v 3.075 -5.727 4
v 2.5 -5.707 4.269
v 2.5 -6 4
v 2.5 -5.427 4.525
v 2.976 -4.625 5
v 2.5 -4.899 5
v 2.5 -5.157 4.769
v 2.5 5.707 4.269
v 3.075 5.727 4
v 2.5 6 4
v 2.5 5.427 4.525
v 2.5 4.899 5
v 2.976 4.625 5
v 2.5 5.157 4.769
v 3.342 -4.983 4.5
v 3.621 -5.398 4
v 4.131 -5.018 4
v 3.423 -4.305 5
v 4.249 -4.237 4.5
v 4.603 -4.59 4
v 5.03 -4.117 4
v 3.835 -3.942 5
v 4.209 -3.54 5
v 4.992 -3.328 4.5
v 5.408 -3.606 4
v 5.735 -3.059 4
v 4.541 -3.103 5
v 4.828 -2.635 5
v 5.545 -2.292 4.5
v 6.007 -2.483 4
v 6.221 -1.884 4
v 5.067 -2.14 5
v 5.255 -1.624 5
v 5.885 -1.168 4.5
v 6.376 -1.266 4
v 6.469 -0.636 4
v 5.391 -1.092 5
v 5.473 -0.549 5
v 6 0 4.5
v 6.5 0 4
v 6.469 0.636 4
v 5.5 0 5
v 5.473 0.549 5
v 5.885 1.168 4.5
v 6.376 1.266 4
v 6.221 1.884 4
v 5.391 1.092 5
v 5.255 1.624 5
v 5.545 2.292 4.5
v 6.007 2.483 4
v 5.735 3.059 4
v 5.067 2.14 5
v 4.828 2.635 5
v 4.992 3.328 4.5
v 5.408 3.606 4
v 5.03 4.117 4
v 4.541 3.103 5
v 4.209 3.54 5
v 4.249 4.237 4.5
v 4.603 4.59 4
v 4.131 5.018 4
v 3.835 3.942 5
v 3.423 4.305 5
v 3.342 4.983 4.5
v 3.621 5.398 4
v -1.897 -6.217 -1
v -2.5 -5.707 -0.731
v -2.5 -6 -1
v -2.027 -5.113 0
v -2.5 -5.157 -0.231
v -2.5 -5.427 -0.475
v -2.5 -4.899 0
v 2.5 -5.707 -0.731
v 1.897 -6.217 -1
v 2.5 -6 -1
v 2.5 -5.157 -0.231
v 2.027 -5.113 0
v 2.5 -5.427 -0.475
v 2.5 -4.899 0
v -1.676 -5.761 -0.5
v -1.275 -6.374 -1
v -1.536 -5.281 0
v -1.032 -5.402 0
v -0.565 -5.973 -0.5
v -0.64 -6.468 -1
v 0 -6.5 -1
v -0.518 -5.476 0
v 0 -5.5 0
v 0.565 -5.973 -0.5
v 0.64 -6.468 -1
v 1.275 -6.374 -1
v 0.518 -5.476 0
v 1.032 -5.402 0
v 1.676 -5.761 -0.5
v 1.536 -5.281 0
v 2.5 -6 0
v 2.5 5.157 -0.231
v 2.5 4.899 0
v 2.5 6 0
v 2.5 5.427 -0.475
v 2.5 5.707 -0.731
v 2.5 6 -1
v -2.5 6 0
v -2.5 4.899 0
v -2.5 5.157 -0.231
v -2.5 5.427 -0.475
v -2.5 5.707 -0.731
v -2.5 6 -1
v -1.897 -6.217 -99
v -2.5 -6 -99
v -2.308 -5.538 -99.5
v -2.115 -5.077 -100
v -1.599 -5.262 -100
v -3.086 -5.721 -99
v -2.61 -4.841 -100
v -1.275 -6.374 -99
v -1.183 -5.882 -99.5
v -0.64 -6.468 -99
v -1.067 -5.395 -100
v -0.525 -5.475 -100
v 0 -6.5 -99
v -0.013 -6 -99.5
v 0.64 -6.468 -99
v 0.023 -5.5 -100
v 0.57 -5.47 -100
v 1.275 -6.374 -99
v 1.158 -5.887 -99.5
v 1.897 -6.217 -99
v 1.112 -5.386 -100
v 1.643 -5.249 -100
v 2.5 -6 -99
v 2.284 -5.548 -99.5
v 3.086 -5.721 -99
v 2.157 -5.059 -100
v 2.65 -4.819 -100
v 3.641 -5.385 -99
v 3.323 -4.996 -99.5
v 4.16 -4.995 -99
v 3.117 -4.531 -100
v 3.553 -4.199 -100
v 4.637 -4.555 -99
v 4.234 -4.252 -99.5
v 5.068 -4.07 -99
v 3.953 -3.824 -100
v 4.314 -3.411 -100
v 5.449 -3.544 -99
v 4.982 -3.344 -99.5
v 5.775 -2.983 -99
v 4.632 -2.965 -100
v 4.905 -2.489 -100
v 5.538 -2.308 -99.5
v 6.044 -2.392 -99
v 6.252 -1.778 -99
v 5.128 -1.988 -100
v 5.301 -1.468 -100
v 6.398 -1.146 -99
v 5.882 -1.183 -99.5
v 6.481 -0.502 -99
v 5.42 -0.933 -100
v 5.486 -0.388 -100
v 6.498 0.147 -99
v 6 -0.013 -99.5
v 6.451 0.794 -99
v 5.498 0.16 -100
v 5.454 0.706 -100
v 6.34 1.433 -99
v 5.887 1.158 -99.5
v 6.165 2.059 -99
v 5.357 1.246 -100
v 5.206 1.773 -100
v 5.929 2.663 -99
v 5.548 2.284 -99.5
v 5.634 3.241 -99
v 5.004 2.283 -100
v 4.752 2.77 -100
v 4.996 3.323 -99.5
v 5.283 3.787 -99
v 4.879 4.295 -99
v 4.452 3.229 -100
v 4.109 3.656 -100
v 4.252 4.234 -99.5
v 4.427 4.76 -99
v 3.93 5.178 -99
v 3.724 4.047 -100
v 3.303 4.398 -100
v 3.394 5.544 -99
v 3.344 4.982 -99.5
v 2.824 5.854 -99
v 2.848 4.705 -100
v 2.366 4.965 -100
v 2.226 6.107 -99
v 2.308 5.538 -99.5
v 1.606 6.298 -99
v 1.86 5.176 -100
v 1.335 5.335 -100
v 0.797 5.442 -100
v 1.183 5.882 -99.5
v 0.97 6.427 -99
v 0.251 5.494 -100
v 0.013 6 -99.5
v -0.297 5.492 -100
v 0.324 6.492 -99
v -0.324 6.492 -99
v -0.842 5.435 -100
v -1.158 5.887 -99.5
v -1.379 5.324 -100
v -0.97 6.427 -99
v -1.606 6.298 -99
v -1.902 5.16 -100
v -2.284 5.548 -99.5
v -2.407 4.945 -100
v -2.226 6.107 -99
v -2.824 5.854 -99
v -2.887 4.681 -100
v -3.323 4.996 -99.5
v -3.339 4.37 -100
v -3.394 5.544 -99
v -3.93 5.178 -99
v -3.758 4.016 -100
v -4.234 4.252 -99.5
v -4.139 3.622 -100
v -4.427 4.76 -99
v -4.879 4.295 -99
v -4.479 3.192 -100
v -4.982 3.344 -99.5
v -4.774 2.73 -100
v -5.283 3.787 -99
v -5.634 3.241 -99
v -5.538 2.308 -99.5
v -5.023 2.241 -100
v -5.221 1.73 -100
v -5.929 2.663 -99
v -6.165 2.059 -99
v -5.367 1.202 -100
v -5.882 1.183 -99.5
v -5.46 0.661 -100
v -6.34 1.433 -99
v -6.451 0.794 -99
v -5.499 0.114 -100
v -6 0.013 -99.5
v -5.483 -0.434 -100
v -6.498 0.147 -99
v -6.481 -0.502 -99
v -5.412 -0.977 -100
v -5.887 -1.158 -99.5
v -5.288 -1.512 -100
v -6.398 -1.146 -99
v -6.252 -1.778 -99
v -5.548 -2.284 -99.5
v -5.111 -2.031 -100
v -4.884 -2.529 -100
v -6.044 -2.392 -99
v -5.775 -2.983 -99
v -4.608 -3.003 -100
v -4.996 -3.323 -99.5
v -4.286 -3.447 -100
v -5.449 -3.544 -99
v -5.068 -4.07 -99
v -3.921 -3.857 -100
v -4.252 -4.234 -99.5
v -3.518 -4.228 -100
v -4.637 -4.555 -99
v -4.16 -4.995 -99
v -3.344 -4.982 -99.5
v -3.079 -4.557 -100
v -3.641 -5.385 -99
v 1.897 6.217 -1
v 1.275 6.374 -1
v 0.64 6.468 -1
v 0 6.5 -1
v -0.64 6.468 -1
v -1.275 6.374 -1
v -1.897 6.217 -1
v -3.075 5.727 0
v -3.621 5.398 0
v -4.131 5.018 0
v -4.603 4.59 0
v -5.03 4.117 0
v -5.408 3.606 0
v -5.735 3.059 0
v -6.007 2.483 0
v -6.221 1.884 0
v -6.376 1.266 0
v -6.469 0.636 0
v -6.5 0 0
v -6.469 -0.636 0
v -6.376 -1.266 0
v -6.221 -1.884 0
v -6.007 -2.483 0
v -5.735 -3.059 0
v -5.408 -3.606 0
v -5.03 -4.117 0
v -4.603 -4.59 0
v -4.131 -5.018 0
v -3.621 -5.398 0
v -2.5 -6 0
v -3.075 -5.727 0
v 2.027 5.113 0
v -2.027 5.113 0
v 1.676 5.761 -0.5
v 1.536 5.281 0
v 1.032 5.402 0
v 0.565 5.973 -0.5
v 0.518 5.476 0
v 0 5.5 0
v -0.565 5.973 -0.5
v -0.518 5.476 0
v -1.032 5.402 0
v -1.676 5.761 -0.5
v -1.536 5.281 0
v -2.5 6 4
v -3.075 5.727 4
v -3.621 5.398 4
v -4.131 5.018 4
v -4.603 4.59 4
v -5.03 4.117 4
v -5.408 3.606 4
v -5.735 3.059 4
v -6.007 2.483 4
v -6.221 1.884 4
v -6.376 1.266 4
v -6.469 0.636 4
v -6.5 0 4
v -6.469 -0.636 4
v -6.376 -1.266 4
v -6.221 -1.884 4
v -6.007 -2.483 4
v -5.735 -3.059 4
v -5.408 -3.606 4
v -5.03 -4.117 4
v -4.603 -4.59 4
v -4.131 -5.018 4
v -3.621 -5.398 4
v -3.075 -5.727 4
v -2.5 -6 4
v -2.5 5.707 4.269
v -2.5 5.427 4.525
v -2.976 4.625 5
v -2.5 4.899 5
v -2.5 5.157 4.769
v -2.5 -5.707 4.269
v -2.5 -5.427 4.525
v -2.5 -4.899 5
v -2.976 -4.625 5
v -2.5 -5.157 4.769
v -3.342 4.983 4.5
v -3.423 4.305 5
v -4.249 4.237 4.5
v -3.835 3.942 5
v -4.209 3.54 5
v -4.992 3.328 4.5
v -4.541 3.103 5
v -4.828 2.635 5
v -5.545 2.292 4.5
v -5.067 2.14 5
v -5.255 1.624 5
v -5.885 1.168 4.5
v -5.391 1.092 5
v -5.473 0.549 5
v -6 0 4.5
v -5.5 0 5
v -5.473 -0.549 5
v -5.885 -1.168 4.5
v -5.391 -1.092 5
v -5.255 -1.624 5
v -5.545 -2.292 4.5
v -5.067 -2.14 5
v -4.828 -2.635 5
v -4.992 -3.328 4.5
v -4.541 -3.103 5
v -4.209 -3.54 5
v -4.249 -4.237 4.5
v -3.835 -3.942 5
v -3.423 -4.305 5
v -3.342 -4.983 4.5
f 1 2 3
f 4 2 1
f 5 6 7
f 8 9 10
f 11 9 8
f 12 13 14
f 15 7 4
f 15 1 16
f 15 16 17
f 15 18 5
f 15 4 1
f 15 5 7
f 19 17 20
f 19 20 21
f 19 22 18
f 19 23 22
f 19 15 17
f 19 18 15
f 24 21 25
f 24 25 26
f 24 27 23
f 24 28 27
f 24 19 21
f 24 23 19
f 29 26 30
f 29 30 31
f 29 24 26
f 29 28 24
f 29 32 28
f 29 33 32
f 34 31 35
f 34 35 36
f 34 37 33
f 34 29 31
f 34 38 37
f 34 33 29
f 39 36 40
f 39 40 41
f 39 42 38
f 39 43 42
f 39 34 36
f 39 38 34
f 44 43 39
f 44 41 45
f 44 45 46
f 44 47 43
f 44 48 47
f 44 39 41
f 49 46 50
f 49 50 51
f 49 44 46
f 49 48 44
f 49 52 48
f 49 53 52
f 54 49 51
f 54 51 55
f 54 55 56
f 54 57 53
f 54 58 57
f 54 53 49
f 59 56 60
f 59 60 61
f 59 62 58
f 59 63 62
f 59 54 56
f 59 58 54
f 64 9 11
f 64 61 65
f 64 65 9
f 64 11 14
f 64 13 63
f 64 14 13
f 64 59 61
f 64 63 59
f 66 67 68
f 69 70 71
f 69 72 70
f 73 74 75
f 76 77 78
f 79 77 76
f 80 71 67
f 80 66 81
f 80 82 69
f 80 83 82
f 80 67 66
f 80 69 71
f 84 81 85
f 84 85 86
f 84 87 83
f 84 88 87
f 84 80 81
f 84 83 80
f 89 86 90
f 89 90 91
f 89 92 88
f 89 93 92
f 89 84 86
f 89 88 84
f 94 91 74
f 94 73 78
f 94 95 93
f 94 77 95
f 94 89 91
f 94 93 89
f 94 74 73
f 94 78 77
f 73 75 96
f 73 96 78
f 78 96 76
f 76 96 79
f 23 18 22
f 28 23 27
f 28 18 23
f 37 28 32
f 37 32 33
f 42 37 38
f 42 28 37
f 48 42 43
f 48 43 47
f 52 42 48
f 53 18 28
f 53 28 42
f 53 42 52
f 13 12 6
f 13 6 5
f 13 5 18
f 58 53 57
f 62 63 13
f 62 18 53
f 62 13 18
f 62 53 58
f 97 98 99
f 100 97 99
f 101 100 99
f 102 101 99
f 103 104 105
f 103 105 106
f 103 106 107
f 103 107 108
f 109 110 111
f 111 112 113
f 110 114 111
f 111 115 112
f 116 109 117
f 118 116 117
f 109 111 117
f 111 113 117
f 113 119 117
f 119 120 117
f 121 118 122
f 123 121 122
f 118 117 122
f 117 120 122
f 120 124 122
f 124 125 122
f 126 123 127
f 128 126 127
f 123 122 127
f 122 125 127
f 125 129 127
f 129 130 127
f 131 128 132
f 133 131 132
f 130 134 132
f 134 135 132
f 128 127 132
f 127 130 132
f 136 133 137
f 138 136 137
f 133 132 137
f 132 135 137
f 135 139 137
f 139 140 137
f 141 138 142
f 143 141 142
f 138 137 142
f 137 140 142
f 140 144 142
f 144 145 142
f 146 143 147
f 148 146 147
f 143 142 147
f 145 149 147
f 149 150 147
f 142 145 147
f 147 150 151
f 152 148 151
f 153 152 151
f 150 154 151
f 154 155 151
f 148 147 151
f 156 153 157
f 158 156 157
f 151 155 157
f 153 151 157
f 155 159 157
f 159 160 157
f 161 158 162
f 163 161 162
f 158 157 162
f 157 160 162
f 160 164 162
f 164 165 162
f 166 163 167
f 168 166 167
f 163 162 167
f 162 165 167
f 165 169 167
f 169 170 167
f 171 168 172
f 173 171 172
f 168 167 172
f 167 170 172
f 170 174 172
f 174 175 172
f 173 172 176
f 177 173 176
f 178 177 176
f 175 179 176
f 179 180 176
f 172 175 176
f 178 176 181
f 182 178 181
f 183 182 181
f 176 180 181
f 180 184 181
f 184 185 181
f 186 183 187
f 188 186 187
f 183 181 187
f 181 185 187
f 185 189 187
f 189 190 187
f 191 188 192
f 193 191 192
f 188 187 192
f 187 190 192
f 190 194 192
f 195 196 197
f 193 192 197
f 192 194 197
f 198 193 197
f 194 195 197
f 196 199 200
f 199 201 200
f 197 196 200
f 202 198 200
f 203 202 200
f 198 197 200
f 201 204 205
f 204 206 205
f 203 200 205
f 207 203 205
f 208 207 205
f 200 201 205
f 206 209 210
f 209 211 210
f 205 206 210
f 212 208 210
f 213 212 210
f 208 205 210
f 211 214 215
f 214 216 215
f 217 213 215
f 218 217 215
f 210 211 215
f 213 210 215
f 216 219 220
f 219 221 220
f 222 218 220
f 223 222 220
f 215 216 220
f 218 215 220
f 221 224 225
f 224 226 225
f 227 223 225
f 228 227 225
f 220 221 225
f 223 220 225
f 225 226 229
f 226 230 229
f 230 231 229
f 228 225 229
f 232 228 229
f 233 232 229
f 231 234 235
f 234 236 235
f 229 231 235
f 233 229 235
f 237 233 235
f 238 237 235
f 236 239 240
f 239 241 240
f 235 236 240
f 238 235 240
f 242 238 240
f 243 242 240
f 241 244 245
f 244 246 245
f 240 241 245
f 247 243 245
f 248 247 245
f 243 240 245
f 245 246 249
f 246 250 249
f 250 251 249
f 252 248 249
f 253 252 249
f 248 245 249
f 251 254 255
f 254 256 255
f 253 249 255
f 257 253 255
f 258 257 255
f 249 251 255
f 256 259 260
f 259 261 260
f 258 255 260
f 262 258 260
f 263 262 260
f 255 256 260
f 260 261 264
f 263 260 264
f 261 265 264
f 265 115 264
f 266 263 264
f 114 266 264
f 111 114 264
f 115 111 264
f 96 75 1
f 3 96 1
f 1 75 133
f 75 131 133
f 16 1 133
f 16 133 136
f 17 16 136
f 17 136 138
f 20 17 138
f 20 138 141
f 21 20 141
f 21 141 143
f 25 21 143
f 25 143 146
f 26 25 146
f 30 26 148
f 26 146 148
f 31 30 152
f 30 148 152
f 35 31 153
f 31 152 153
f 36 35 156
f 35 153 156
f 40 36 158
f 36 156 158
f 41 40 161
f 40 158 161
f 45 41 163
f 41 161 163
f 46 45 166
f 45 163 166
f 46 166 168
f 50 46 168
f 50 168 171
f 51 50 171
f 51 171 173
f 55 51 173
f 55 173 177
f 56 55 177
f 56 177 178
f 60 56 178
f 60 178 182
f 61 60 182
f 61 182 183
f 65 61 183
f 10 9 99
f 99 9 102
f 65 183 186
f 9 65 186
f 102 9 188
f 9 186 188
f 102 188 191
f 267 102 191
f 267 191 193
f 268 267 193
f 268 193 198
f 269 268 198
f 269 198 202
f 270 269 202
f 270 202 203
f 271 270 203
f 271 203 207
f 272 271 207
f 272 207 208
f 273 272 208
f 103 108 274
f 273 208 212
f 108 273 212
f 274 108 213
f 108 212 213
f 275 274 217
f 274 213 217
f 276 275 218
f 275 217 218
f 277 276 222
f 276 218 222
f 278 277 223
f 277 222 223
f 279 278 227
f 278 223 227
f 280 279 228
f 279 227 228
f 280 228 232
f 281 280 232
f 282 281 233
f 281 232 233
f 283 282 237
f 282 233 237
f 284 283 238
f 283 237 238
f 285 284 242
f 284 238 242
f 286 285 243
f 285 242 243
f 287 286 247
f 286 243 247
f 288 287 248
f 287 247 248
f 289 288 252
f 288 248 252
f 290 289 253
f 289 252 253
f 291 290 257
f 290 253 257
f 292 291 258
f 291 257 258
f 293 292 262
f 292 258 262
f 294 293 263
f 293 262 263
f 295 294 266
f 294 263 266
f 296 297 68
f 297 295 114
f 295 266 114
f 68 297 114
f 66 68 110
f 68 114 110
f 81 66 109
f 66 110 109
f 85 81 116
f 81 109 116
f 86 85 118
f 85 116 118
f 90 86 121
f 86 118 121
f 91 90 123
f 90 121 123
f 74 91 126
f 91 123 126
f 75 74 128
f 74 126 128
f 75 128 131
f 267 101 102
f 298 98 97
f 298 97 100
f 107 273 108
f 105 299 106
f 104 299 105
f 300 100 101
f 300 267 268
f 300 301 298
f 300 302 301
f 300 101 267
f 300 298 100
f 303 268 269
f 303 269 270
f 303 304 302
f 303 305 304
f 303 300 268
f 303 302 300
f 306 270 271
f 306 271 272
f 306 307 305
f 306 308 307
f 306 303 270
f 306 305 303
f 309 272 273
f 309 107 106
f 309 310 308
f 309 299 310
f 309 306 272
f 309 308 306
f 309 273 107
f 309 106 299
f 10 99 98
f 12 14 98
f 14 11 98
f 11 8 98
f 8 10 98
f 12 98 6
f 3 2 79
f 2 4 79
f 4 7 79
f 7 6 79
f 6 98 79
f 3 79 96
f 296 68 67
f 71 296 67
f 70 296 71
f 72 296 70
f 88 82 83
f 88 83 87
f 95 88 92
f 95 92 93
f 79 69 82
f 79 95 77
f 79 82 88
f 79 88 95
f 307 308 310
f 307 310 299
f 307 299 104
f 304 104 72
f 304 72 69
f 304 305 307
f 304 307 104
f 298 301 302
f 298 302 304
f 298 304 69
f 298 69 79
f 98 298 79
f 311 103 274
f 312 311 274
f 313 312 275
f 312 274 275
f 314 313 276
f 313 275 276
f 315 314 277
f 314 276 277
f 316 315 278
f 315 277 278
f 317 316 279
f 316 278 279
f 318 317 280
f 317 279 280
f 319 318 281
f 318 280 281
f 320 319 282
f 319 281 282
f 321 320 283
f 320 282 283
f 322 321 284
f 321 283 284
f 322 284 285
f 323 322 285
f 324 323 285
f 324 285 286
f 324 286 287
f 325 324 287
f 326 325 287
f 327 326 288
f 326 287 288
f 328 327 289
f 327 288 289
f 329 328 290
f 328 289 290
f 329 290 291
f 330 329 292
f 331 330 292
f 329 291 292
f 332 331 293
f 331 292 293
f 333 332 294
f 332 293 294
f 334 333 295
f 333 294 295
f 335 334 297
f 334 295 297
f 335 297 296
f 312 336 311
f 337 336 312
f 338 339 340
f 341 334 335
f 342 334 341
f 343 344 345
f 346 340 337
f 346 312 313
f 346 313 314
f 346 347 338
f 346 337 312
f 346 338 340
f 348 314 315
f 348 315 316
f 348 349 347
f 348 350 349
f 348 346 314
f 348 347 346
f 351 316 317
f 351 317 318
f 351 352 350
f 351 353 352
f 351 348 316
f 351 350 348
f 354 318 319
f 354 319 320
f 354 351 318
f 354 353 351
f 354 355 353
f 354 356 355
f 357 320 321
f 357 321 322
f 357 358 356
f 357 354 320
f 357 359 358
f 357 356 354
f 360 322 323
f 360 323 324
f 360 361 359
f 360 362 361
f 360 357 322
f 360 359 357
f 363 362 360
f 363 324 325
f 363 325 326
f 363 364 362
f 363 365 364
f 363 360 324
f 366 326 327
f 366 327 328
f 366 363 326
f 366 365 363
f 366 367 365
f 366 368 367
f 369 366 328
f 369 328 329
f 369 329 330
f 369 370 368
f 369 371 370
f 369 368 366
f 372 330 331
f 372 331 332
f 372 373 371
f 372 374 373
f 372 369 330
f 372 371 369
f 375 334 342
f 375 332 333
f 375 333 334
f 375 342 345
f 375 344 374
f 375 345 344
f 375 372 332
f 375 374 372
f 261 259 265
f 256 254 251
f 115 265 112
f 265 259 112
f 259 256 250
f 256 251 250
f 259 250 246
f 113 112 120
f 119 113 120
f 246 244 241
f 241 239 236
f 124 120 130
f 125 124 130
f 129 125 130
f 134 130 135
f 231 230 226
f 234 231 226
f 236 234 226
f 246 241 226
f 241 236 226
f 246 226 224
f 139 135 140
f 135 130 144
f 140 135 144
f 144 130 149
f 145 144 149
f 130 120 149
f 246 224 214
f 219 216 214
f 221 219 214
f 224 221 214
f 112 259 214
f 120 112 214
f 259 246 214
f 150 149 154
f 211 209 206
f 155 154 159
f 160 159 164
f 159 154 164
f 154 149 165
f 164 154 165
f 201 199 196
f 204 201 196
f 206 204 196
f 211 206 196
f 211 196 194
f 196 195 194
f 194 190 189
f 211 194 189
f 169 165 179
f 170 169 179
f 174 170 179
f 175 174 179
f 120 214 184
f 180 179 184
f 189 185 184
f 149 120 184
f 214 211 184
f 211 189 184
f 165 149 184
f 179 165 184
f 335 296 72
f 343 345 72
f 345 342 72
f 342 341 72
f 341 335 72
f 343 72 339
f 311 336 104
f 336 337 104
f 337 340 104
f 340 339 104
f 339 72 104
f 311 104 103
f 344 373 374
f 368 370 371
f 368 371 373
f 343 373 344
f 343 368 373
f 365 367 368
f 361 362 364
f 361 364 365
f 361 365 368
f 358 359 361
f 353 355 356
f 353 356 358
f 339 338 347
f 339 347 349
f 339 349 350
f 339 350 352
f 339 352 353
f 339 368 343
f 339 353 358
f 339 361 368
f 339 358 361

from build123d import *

# Parameters (mm, degrees)
F1_DEPTH     = 100
F2_DEPTH     = 5
F3_T2_ANGLE  = 180.1385265573
F3_T4_ANGLE  = 180.1385265573
F3_T10_ANGLE = 90.5817403508
F3_T16_ANGLE = 90.5817403508


# Not quite as in the source:
# - a fillet or chamfer that OpenCascade refuses, or shapes differently, is made with other operations: its cross-section is extruded or revolved along the edge and cut away or added


with BuildPart() as f1:
    # F0 (on Top) → F1 (new body)
    with BuildSketch(Plane.XY):
        with BuildLine():
            Line((-2.5, -6), (-2.5, 6))
            ThreePointArc((-2.5, 6), (-6.5, 0), (-2.5, -6))
        make_face()
        with BuildLine():
            ThreePointArc((2.5, -6), (5.4083269132, -3.6055512755), (6.5, 0))
            ThreePointArc((6.5, 0), (5.4083269132, 3.6055512755), (2.5, 6))
            Line((2.5, 6), (2.5, -6))
        make_face()
        with BuildLine():
            Line((2.5, -6), (2.5, 6))
            ThreePointArc((2.5, 6), (0, 6.5), (-2.5, 6))
            Line((-2.5, 6), (-2.5, -6))
            ThreePointArc((-2.5, -6), (0, -6.5), (2.5, -6))
        make_face()
    extrude(amount=-F1_DEPTH)

    # F0 (on Top) → F2 (join)
    with BuildSketch(Plane.XY):
        with BuildLine():
            Line((-2.5, -6), (-2.5, 6))
            ThreePointArc((-2.5, 6), (-6.5, 0), (-2.5, -6))
        make_face()
        with BuildLine():
            ThreePointArc((2.5, -6), (5.4083269132, -3.6055512755), (6.5, 0))
            ThreePointArc((6.5, 0), (5.4083269132, 3.6055512755), (2.5, 6))
            Line((2.5, 6), (2.5, -6))
        make_face()
    extrude(amount=F2_DEPTH)

    # F3: chamfer of 1 on 7 edges, made by hand

    # F3_s1 → F3_t2 (revolve, cut)
    with BuildSketch(Plane(origin=(0, 0, 0), x_dir=(0, 0, 1), z_dir=(0.9999992693, -0.001208872, 0))):
        Polygon((4, -6.5), (5, -5.5), (5, -6.5), align=None)
    revolve(axis=Axis((0, 0, 5), (0, 0, 1)), revolution_arc=F3_T2_ANGLE, mode=Mode.SUBTRACT)

    # F3_s3 → F3_t4 (revolve, cut)
    with BuildSketch(Plane(origin=(0, 0, 0), x_dir=(0, 0, 1), z_dir=(-0.9999992693, 0.001208872, 0))):
        Polygon((4, -6.5), (5, -5.5), (5, -6.5), align=None)
    revolve(axis=Axis((0, 0, 5), (0, 0, 1)), revolution_arc=F3_T4_ANGLE, mode=Mode.SUBTRACT)

    # F3_s5 → F3_t6 (revolve, cut)
    with BuildSketch(Plane(origin=(0, 0, 0), x_dir=(0, 0, 1), z_dir=(-0.9230769231, 0.3846153846, 0))):
        Polygon((-99, -6.5), (-100, -5.5), (-100, -6.5), align=None)
    revolve(axis=Axis((0, 0, -100), (0, 0, 1)), mode=Mode.SUBTRACT)


with BuildPart() as f3_tool8:
    # F3_s9 → F3_t10 (revolve)
    with BuildSketch(Plane(origin=(0, 0, 0), x_dir=(0, 0, 1), z_dir=(-0.7035079566, 0.7106873821, 0))):
        Polygon((-1, -6.5), (0, -5.5), (0, -6.5), align=None)
    revolve(axis=Axis((0, 0, 0), (0, 0, 1)), revolution_arc=F3_T10_ANGLE)

    split(bisect_by=Plane.YZ.offset(-2.5), keep=Keep.TOP)

    split(bisect_by=Plane.YZ.offset(2.5), keep=Keep.BOTTOM)


with BuildPart() as f1_1:
    add(f1.part)

    # F3_t7: cut F3_tool8
    add(f3_tool8.part, mode=Mode.SUBTRACT)


with BuildPart() as f3_tool14:
    # F3_s15 → F3_t16 (revolve)
    with BuildSketch(Plane(origin=(0, 0, 0), x_dir=(0, 0, 1), z_dir=(0.7035079566, -0.7106873821, 0))):
        Polygon((-1, -6.5), (0, -5.5), (0, -6.5), align=None)
    revolve(axis=Axis((0, 0, 0), (0, 0, 1)), revolution_arc=F3_T16_ANGLE)

    split(bisect_by=Plane.YZ.offset(-2.5), keep=Keep.TOP)

    split(bisect_by=Plane.YZ.offset(2.5), keep=Keep.BOTTOM)


with BuildPart() as f1_2:
    add(f1_1.part)

    # F3_t13: cut F3_tool14
    add(f3_tool14.part, mode=Mode.SUBTRACT)


solid = f1_2.part
